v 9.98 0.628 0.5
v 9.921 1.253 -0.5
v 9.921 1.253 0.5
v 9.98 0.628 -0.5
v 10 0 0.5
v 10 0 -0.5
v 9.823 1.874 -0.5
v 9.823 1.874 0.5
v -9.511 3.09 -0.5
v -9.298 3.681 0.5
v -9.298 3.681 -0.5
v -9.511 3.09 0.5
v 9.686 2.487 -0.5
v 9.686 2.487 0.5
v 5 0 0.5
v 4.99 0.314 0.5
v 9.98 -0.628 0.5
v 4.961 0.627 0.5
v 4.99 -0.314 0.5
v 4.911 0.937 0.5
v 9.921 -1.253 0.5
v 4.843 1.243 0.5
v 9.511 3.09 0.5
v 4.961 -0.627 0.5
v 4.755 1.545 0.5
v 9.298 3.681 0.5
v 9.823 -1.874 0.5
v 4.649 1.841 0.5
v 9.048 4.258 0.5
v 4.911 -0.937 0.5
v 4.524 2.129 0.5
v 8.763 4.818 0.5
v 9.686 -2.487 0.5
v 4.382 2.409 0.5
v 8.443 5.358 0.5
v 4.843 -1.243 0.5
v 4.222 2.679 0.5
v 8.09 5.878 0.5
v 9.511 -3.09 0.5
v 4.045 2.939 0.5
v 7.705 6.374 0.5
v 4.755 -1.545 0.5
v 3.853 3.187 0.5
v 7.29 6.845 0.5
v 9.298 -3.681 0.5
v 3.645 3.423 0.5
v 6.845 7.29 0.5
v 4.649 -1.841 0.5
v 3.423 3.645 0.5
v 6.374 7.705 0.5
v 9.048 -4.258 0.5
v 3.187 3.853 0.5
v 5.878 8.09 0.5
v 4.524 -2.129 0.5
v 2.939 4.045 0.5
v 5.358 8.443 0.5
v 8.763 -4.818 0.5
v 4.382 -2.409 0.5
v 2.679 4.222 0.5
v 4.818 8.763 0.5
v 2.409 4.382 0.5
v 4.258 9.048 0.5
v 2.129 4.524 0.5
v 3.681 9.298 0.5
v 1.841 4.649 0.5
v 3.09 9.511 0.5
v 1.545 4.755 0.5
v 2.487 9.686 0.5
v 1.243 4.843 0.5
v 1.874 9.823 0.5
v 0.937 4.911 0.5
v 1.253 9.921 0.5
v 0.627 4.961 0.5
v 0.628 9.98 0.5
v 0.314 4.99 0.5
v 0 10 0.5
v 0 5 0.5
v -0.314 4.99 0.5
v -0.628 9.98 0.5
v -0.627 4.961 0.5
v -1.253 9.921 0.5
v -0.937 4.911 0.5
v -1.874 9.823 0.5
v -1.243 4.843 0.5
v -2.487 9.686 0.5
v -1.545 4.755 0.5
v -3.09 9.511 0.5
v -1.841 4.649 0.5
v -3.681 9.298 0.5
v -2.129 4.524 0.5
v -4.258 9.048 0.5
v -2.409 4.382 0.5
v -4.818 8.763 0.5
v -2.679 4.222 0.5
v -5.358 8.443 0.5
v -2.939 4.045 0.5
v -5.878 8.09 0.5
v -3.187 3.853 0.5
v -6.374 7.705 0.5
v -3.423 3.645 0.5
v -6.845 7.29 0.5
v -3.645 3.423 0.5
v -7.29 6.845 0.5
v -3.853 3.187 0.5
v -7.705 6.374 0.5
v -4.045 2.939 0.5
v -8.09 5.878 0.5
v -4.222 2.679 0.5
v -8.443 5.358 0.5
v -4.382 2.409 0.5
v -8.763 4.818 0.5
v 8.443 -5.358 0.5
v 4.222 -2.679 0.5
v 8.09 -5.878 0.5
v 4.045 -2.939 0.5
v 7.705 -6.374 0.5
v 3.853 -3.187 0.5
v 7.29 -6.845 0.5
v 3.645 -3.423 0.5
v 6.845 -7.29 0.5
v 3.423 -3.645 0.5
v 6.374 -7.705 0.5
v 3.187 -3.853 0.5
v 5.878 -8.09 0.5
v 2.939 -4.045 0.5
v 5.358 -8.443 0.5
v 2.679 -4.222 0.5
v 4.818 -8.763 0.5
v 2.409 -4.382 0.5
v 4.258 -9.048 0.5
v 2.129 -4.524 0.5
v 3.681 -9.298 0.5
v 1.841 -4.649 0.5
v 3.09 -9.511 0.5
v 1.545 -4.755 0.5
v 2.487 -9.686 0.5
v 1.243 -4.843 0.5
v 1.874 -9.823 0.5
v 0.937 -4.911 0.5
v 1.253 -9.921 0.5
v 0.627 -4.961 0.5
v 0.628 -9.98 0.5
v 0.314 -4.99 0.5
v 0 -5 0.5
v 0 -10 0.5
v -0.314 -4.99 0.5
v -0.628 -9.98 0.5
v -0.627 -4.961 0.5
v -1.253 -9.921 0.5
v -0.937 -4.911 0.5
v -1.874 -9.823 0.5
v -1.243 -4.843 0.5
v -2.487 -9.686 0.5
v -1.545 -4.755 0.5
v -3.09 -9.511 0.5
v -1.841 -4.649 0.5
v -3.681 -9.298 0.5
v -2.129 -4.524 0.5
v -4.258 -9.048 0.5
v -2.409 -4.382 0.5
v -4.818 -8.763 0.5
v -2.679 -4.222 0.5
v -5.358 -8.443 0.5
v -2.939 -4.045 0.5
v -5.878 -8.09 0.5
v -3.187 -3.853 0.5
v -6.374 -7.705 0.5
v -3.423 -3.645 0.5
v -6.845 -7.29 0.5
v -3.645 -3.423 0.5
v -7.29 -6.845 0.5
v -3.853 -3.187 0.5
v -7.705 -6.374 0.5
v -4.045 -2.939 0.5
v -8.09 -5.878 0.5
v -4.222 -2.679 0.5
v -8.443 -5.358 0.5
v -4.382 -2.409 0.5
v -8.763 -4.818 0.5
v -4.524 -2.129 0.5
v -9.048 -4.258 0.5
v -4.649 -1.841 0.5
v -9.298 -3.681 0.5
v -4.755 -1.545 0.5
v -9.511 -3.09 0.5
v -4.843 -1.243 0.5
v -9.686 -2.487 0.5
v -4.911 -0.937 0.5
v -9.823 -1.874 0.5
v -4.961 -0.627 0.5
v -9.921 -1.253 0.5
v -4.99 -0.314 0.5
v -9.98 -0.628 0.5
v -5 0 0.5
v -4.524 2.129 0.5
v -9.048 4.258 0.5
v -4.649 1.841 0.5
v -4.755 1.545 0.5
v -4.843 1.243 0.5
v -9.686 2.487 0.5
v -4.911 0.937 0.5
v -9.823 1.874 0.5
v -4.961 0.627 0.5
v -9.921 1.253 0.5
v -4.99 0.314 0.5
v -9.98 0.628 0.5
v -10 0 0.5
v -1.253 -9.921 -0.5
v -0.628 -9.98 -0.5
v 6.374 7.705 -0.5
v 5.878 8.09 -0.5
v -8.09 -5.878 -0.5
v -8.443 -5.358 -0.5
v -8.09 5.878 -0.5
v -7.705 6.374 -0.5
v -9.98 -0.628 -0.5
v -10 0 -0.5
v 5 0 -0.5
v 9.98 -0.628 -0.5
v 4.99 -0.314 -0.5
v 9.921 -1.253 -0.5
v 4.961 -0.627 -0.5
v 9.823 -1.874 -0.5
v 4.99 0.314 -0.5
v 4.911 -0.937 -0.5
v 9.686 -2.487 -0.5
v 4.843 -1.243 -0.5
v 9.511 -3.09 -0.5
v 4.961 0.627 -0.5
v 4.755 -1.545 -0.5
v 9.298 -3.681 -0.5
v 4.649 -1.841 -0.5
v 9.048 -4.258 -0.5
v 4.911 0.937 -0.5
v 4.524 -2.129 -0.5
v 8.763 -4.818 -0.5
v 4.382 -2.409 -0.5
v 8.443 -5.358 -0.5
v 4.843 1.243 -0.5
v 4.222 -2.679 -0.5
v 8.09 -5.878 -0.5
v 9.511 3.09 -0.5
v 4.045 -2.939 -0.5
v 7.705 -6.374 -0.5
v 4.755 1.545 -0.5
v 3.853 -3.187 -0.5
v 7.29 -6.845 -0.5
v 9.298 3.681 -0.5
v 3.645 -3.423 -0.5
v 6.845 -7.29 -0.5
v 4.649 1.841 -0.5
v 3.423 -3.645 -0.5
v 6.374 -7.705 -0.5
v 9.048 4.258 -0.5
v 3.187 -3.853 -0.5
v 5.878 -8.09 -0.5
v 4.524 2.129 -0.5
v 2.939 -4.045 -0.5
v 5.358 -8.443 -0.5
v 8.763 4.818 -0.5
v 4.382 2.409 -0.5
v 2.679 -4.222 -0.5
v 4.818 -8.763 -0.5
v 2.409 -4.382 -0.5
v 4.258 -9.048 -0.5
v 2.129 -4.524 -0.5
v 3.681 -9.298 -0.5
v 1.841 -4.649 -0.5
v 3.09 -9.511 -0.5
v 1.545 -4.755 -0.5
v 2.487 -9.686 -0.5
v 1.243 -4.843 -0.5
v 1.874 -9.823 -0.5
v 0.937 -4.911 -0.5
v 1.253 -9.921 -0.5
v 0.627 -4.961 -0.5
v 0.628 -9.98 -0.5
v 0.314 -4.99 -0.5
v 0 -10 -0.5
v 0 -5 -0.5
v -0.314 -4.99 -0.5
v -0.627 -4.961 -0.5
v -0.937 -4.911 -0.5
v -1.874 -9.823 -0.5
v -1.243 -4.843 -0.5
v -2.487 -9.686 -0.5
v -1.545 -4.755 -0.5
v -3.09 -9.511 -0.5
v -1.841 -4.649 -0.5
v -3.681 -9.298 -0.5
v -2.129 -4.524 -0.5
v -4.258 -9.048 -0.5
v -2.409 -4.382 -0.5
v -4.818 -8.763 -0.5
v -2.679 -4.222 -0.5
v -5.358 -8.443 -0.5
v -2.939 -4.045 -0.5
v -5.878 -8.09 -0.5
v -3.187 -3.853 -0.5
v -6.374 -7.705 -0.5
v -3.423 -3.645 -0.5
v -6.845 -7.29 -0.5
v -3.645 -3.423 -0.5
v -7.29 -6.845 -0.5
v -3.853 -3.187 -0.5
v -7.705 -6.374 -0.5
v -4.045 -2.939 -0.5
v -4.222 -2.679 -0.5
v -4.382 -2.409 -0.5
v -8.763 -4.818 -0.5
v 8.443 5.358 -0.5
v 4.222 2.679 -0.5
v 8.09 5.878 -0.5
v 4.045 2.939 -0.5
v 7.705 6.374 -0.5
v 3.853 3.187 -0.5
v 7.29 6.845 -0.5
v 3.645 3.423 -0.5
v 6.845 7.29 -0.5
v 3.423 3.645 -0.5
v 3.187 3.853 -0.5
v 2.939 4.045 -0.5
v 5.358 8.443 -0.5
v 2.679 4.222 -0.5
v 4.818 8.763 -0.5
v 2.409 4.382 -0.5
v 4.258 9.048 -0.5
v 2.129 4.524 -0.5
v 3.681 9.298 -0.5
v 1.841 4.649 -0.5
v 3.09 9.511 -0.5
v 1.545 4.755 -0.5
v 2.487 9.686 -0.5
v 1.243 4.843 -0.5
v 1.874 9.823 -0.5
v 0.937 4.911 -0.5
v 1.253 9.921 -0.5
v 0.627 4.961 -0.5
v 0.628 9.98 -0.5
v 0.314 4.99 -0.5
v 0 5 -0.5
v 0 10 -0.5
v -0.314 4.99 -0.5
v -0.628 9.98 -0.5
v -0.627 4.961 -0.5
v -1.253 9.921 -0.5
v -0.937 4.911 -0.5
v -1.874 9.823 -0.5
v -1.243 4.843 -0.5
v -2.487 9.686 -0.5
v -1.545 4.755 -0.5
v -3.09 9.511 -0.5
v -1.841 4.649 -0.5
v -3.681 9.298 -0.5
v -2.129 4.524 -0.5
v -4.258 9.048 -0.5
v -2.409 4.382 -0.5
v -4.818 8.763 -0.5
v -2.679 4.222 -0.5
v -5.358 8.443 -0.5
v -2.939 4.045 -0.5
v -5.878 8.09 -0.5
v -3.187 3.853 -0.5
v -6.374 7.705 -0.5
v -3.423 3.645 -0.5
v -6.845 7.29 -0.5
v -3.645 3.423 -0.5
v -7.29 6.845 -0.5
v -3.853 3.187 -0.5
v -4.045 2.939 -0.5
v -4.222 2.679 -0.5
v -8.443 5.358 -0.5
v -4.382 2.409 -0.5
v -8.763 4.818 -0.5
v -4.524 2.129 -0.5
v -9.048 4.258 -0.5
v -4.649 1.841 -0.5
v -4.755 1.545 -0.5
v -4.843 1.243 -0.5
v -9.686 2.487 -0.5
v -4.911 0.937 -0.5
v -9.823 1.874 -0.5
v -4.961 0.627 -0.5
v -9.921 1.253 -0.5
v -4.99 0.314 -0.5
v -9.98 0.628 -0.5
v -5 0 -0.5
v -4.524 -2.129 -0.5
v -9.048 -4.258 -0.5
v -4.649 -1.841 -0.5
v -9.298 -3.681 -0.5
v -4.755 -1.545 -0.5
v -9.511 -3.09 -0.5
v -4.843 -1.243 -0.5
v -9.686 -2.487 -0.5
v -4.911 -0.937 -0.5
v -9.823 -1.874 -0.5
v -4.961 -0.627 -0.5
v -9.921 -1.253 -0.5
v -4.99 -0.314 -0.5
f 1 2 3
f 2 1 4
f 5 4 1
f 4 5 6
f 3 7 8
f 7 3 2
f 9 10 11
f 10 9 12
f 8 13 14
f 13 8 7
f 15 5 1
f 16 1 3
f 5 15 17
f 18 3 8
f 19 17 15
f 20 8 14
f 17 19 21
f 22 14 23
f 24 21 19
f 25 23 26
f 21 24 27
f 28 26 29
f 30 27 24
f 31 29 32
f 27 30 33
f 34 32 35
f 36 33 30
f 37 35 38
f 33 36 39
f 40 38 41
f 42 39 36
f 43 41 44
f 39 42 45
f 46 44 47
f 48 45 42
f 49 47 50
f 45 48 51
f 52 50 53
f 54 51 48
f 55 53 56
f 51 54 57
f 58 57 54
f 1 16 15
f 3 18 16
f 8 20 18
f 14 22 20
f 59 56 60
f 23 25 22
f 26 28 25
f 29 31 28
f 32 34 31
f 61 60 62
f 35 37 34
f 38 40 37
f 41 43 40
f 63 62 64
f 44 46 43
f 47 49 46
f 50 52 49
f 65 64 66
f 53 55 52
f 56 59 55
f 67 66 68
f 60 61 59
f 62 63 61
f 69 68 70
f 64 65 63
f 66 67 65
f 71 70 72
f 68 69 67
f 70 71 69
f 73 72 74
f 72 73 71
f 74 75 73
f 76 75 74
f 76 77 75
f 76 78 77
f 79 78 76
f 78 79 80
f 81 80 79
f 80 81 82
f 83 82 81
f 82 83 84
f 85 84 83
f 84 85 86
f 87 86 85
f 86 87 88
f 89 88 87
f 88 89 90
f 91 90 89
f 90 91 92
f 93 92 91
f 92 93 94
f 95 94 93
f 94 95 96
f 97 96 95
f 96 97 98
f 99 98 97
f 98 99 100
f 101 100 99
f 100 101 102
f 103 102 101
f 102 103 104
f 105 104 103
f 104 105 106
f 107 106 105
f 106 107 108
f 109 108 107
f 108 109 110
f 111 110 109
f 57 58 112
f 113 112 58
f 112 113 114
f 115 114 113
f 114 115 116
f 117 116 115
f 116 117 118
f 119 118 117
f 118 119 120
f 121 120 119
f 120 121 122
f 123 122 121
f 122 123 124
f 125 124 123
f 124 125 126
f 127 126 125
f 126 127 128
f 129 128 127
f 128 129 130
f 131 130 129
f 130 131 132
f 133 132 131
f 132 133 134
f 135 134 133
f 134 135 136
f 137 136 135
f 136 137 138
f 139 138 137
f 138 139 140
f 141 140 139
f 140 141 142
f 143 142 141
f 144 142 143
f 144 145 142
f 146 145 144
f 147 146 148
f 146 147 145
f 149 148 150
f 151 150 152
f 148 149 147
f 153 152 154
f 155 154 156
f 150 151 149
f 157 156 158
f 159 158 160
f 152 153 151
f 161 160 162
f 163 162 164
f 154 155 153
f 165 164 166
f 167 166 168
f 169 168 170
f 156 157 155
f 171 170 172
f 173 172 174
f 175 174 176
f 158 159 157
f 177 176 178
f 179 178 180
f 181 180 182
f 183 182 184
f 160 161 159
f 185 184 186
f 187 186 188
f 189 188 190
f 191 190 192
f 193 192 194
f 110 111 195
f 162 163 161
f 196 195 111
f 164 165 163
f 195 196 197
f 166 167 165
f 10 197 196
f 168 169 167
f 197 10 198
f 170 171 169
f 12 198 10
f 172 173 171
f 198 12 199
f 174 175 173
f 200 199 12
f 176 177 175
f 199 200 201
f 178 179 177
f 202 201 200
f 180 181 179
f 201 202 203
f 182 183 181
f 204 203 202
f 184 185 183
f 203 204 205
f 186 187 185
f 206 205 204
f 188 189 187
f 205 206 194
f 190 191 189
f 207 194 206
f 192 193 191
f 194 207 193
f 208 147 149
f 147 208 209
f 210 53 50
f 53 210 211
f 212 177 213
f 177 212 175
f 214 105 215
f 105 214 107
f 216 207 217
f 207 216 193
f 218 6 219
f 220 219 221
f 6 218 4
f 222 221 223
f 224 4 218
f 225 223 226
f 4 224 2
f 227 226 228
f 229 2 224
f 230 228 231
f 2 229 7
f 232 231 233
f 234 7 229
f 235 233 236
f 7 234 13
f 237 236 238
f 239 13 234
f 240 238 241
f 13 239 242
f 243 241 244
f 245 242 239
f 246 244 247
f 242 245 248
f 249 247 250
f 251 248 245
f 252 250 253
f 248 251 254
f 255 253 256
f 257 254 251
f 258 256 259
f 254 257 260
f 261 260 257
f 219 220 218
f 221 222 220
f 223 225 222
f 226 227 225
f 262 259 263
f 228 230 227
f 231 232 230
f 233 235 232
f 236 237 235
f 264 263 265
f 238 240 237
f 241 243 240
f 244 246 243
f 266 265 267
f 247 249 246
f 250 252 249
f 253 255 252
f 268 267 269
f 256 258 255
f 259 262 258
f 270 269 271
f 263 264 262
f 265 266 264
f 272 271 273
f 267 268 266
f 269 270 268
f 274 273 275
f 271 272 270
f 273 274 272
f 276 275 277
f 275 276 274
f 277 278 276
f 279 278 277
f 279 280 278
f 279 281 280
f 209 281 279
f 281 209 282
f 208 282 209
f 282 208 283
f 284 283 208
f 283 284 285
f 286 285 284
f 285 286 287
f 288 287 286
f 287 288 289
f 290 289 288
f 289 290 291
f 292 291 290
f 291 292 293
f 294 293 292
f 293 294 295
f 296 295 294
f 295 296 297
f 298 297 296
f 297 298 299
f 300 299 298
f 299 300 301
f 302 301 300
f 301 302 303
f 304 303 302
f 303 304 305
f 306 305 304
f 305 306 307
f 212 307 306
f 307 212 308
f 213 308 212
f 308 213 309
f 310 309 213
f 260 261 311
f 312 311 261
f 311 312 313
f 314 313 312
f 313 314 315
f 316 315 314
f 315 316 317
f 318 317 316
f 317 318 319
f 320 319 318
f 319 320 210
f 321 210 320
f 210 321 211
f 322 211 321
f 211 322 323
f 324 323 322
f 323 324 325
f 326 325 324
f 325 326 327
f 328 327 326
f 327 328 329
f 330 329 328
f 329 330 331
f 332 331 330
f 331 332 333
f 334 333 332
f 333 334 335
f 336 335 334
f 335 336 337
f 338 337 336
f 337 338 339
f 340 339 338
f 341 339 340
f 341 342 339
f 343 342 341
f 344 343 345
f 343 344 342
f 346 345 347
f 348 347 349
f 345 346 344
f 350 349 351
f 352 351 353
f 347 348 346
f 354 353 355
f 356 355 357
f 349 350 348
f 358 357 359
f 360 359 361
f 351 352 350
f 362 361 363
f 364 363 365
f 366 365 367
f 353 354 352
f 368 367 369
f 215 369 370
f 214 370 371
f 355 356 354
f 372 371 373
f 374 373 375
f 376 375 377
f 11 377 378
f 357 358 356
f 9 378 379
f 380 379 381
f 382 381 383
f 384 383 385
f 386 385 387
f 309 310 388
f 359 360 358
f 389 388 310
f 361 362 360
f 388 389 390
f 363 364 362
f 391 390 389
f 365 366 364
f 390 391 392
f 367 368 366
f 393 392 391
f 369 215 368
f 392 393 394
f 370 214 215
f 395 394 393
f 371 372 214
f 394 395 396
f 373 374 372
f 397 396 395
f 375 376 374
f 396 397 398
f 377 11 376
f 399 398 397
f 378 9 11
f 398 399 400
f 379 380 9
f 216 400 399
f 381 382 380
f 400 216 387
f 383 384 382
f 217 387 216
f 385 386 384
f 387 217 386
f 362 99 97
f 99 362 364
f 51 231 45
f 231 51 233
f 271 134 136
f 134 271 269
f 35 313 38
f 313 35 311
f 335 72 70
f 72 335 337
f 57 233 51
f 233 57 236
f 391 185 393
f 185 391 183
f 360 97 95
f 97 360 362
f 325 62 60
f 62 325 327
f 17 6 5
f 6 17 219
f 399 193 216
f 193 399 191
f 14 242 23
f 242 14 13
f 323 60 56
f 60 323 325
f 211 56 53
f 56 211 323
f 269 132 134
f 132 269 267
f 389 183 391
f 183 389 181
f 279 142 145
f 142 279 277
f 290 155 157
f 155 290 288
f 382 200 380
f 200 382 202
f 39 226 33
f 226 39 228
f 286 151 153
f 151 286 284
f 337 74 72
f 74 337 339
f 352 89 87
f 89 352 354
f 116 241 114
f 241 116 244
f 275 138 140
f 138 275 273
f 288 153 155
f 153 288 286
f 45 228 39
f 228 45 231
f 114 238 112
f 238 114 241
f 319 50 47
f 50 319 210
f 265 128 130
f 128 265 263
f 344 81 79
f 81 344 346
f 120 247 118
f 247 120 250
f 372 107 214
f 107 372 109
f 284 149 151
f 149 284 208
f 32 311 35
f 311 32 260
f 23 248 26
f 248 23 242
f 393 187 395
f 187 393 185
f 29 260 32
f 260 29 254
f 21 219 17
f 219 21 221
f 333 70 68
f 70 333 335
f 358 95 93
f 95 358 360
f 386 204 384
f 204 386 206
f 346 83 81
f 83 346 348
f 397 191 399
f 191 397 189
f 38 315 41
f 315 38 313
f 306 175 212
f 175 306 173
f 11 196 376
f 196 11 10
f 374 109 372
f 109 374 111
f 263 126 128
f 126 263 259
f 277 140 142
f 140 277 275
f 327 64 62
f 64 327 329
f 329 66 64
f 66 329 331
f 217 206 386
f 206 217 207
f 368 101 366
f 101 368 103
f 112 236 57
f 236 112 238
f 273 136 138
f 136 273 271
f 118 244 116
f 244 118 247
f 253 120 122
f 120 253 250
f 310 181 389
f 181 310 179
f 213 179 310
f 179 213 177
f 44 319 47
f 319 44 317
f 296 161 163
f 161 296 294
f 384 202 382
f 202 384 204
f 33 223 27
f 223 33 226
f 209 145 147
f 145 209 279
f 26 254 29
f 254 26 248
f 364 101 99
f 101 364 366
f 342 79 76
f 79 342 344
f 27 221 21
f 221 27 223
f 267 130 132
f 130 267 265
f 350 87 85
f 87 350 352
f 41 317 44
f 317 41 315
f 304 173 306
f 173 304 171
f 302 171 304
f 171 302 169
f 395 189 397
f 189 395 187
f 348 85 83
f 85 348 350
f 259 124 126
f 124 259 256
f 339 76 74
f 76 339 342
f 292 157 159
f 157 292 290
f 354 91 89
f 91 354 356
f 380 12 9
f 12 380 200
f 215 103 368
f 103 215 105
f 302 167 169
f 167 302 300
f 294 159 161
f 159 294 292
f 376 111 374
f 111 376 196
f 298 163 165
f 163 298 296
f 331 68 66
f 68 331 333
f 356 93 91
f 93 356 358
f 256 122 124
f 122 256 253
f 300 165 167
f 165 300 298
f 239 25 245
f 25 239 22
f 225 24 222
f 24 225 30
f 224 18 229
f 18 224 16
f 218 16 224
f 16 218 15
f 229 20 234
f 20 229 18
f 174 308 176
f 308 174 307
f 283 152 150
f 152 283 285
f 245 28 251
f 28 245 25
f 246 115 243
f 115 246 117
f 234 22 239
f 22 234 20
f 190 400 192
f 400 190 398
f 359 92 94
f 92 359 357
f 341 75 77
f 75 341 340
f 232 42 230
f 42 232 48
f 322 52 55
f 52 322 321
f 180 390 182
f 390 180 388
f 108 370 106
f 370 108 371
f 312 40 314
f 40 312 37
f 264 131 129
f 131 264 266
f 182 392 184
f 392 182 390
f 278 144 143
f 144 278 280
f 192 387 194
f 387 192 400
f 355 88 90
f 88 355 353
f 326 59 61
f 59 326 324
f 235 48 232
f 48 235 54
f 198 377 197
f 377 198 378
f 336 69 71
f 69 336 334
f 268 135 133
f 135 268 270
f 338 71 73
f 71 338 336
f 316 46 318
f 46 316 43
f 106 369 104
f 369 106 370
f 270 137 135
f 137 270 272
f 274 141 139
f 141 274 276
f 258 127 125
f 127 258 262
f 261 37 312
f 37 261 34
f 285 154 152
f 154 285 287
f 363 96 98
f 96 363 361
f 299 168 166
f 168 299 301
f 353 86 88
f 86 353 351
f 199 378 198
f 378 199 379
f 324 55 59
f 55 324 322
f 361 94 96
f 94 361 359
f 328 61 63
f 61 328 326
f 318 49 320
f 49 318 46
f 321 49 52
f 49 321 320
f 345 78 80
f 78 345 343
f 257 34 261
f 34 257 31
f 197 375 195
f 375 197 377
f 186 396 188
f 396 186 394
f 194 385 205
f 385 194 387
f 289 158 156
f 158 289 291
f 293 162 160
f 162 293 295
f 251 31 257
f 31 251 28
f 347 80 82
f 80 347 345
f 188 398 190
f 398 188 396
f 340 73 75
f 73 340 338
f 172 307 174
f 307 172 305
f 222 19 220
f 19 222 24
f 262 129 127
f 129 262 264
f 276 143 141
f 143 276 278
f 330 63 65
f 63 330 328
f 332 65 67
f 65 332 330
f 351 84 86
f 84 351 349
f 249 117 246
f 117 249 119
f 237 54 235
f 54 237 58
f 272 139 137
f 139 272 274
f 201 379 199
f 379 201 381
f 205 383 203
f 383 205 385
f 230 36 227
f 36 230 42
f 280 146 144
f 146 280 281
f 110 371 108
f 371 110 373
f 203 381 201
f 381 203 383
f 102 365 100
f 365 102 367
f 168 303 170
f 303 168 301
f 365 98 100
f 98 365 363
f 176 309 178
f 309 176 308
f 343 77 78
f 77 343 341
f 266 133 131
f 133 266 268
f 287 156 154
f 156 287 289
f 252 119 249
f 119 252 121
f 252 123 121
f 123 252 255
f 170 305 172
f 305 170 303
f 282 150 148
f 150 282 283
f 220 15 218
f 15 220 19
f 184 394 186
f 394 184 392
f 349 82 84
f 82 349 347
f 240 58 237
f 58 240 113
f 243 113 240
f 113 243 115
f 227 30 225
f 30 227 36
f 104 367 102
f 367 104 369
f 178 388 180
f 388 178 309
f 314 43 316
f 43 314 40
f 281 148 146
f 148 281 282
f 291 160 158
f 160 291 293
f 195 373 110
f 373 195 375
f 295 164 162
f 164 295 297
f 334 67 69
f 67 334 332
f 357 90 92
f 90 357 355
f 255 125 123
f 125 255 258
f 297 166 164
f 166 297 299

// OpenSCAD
thickness=1;
$fn=100;

difference(){
  cylinder(r=10, h=thickness, center=true);
  cylinder(r=5, h=thickness+1, center=true);
};
